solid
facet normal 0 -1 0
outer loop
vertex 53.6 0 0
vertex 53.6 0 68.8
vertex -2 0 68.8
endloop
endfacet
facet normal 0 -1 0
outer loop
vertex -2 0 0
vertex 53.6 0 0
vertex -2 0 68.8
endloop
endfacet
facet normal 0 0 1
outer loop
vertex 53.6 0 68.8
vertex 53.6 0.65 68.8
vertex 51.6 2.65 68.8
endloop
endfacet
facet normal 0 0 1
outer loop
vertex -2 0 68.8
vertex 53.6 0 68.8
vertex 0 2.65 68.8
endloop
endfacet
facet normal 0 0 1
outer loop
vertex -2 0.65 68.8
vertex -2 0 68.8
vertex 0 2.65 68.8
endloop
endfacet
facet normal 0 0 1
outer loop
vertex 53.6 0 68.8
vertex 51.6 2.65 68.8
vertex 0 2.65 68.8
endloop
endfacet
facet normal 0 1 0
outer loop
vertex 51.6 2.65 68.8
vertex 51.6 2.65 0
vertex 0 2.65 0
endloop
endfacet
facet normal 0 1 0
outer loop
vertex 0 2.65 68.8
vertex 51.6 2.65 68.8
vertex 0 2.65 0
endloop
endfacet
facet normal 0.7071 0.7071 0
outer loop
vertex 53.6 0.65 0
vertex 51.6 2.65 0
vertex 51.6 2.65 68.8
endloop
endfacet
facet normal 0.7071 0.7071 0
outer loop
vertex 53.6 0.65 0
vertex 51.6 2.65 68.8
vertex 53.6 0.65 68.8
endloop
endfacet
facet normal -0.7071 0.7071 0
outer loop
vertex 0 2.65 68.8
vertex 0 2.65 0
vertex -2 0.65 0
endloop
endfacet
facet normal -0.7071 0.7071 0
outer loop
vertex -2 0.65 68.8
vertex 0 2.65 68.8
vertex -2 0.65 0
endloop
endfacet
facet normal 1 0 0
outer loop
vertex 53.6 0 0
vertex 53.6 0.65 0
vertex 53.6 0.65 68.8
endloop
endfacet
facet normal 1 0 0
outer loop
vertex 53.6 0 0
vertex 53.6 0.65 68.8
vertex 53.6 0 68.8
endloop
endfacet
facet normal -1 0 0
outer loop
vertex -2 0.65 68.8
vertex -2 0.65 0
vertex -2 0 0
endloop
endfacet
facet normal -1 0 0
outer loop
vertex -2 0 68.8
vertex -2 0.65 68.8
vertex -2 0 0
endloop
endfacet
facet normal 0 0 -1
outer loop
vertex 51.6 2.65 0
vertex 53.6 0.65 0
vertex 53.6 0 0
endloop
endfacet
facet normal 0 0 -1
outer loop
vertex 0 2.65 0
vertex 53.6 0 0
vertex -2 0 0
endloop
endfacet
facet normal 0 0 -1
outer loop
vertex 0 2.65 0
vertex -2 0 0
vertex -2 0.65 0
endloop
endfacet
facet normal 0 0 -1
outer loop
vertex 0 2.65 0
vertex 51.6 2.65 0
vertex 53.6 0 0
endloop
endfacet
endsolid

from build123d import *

# Parameters (mm, degrees)
SKETCH1_W           = 25.8
SKETCH1_H           = 2.65
BOSS_EXTRUDE1_DEPTH = 68.8


with BuildPart() as part:
    # Sketch1 → Boss-Extrude1 (new body)
    with BuildSketch(Plane.XY):
        Polygon((-2, 0.65), (-2, 0), (0, 0), (0, 2.65), align=None)
        with Locations((12.9, 1.325)):
            Rectangle(SKETCH1_W, SKETCH1_H)
    boss_extrude1 = extrude(amount=BOSS_EXTRUDE1_DEPTH)

    # Mirror1: Boss-Extrude1 across plane
    add(boss_extrude1.mirror(Plane(origin=(25.8, 0, 68.8), x_dir=(0, 0, 1), z_dir=(-1, 0, 0))))


solid = part.part
